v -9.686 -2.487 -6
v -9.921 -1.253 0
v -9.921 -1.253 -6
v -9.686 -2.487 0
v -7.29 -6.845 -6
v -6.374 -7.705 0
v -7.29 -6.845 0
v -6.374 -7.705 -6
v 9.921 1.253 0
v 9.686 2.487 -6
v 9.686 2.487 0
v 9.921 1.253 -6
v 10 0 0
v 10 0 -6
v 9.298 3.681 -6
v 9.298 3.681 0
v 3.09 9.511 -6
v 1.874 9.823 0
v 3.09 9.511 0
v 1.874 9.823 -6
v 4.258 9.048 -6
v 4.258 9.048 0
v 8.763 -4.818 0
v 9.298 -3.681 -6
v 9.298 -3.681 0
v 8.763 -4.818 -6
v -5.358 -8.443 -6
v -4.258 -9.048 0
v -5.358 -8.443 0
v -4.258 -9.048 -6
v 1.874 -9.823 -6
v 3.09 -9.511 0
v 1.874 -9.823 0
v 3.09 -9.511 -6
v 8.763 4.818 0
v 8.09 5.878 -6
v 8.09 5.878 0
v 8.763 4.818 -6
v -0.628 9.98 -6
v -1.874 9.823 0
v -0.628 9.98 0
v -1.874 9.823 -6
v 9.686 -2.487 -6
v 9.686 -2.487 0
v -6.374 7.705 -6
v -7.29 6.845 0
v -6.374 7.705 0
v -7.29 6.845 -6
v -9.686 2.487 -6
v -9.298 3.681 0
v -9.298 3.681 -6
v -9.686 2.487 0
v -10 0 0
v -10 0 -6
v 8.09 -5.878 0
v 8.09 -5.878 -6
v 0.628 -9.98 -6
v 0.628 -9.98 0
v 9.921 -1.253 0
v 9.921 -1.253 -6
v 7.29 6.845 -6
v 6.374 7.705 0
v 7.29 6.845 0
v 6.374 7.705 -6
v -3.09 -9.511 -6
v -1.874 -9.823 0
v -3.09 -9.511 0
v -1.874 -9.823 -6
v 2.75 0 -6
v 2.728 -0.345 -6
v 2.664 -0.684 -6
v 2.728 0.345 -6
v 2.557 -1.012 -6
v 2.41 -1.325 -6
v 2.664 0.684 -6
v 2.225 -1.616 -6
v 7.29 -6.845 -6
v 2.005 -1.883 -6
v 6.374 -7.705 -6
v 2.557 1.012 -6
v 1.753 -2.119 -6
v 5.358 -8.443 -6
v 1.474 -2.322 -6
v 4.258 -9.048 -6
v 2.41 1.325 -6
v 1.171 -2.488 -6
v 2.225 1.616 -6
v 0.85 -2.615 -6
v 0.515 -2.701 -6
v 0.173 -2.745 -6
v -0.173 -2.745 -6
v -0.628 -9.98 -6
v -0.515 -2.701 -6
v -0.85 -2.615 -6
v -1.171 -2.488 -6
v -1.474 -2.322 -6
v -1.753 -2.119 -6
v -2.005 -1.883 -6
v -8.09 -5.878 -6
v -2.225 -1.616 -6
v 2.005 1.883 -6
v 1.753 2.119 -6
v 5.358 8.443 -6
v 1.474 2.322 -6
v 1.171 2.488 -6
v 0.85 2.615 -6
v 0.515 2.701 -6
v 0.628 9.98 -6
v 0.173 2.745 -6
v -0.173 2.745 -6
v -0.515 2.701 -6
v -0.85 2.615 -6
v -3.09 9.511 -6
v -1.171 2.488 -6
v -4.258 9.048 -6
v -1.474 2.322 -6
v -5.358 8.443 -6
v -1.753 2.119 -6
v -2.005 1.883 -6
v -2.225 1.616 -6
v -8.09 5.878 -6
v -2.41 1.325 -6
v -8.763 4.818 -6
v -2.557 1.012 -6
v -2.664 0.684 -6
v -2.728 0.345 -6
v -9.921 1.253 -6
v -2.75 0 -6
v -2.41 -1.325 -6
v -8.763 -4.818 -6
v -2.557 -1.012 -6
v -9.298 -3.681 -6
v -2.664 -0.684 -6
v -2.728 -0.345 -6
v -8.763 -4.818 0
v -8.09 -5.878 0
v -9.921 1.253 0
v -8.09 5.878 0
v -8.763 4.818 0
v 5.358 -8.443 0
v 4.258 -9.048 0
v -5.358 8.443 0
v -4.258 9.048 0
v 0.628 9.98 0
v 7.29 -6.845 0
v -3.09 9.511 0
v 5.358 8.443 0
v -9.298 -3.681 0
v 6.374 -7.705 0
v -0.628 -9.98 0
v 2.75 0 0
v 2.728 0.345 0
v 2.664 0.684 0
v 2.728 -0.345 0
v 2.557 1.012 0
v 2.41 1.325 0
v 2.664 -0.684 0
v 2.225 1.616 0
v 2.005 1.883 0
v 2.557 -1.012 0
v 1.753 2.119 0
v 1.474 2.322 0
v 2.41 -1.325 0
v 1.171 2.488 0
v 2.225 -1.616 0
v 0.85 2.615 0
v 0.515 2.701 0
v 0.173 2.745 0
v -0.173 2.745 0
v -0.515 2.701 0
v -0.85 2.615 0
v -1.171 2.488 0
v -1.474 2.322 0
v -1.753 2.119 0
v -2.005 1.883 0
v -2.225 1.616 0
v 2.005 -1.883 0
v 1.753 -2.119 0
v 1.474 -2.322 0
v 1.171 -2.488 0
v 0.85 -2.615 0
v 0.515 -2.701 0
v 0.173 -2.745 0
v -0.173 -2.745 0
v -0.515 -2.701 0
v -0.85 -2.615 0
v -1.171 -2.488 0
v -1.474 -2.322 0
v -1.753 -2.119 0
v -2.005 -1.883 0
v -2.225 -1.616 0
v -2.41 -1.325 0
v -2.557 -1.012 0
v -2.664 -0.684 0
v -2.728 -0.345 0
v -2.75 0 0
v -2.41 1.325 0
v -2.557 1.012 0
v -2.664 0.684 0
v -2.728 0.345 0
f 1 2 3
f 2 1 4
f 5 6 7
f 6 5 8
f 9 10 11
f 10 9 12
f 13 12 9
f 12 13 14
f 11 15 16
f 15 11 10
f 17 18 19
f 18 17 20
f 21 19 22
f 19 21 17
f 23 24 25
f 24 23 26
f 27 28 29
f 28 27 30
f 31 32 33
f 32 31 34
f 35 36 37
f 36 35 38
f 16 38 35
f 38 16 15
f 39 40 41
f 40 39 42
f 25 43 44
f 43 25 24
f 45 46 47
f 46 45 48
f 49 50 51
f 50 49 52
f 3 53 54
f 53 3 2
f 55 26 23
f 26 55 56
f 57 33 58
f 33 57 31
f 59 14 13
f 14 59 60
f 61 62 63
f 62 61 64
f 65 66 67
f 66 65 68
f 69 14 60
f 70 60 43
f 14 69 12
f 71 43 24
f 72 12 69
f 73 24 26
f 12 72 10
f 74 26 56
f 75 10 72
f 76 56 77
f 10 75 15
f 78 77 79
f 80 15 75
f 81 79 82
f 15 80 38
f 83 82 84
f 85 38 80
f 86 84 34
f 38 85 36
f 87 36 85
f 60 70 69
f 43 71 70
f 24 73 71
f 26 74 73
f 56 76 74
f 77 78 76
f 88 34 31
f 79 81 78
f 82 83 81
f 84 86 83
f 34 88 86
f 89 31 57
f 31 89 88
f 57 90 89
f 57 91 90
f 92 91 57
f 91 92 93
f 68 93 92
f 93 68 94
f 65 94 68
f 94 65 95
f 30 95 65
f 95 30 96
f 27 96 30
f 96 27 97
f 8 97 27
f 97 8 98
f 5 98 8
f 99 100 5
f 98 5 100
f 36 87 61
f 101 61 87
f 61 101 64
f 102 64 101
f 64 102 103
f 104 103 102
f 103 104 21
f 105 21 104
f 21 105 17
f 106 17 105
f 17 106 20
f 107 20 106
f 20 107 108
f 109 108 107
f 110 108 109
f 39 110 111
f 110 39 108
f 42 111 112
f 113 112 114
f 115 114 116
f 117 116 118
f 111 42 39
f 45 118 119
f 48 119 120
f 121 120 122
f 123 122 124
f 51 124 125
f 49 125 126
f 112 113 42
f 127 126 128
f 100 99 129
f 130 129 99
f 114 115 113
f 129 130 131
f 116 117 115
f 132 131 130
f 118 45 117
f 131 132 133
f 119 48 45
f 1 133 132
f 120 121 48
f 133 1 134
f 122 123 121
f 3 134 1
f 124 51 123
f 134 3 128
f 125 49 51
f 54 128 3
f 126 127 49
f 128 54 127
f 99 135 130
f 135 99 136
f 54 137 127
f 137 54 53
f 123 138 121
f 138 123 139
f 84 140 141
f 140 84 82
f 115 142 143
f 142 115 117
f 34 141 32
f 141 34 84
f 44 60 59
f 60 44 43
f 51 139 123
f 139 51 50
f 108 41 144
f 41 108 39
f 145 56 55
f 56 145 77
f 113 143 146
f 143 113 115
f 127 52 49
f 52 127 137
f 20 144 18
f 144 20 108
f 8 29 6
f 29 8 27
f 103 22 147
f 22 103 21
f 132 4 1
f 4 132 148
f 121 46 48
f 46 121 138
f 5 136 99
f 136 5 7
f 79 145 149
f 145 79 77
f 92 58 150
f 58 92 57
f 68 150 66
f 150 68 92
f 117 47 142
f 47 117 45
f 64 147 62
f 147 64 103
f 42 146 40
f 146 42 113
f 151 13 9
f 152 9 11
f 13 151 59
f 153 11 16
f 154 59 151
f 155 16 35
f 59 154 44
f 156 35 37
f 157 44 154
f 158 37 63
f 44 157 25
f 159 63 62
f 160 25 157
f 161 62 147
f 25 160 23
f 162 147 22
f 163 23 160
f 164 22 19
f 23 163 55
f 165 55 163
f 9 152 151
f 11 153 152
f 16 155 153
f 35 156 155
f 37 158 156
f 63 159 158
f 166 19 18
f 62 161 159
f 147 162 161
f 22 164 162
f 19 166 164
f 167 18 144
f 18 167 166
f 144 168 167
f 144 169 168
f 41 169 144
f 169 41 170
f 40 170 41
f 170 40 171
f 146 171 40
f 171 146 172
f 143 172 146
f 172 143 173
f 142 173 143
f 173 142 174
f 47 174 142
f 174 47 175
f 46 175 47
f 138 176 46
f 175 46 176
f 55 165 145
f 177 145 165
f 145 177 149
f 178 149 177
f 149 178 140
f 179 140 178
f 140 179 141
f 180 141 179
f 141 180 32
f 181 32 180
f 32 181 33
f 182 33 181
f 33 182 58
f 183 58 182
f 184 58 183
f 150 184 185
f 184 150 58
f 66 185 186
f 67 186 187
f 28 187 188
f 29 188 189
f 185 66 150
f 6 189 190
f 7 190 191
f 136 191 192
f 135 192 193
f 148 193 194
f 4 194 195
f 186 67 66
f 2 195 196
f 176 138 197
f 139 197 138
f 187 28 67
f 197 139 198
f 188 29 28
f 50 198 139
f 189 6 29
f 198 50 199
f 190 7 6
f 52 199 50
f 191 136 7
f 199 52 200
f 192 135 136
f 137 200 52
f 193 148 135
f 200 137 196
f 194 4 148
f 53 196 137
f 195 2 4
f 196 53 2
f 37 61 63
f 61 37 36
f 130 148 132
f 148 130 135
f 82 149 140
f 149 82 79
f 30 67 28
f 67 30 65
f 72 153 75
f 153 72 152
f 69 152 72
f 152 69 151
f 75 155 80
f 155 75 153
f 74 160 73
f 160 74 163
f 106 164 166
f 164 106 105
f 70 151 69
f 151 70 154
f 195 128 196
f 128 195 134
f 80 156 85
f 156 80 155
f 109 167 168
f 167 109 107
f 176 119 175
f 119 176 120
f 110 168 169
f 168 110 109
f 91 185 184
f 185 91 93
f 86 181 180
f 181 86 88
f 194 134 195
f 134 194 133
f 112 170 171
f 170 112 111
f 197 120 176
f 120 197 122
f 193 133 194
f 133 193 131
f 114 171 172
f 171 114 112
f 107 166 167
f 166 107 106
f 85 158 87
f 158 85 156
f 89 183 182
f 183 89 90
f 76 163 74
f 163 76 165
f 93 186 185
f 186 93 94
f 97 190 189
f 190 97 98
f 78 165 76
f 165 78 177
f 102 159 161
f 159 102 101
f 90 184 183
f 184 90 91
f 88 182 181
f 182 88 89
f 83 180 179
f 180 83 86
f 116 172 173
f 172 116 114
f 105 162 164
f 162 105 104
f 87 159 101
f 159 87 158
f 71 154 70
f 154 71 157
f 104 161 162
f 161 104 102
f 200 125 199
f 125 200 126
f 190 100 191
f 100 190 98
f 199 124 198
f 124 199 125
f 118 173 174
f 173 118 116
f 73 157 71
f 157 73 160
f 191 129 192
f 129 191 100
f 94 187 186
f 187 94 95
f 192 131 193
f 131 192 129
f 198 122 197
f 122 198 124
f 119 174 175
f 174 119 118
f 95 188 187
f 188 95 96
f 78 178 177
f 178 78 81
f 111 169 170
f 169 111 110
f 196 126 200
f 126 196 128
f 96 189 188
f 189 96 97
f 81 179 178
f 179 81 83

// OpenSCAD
$fn = 50;


difference() {
	union() {
		translate(v = [0, 0, -6.0000000000]) {
			cylinder(h = 6, r = 10.0000000000);
		}
	}
	union() {
		#translate(v = [0, 0, -6]) {
			cylinder(h = 6, r = 2.7500000000);
		}
	}
}
